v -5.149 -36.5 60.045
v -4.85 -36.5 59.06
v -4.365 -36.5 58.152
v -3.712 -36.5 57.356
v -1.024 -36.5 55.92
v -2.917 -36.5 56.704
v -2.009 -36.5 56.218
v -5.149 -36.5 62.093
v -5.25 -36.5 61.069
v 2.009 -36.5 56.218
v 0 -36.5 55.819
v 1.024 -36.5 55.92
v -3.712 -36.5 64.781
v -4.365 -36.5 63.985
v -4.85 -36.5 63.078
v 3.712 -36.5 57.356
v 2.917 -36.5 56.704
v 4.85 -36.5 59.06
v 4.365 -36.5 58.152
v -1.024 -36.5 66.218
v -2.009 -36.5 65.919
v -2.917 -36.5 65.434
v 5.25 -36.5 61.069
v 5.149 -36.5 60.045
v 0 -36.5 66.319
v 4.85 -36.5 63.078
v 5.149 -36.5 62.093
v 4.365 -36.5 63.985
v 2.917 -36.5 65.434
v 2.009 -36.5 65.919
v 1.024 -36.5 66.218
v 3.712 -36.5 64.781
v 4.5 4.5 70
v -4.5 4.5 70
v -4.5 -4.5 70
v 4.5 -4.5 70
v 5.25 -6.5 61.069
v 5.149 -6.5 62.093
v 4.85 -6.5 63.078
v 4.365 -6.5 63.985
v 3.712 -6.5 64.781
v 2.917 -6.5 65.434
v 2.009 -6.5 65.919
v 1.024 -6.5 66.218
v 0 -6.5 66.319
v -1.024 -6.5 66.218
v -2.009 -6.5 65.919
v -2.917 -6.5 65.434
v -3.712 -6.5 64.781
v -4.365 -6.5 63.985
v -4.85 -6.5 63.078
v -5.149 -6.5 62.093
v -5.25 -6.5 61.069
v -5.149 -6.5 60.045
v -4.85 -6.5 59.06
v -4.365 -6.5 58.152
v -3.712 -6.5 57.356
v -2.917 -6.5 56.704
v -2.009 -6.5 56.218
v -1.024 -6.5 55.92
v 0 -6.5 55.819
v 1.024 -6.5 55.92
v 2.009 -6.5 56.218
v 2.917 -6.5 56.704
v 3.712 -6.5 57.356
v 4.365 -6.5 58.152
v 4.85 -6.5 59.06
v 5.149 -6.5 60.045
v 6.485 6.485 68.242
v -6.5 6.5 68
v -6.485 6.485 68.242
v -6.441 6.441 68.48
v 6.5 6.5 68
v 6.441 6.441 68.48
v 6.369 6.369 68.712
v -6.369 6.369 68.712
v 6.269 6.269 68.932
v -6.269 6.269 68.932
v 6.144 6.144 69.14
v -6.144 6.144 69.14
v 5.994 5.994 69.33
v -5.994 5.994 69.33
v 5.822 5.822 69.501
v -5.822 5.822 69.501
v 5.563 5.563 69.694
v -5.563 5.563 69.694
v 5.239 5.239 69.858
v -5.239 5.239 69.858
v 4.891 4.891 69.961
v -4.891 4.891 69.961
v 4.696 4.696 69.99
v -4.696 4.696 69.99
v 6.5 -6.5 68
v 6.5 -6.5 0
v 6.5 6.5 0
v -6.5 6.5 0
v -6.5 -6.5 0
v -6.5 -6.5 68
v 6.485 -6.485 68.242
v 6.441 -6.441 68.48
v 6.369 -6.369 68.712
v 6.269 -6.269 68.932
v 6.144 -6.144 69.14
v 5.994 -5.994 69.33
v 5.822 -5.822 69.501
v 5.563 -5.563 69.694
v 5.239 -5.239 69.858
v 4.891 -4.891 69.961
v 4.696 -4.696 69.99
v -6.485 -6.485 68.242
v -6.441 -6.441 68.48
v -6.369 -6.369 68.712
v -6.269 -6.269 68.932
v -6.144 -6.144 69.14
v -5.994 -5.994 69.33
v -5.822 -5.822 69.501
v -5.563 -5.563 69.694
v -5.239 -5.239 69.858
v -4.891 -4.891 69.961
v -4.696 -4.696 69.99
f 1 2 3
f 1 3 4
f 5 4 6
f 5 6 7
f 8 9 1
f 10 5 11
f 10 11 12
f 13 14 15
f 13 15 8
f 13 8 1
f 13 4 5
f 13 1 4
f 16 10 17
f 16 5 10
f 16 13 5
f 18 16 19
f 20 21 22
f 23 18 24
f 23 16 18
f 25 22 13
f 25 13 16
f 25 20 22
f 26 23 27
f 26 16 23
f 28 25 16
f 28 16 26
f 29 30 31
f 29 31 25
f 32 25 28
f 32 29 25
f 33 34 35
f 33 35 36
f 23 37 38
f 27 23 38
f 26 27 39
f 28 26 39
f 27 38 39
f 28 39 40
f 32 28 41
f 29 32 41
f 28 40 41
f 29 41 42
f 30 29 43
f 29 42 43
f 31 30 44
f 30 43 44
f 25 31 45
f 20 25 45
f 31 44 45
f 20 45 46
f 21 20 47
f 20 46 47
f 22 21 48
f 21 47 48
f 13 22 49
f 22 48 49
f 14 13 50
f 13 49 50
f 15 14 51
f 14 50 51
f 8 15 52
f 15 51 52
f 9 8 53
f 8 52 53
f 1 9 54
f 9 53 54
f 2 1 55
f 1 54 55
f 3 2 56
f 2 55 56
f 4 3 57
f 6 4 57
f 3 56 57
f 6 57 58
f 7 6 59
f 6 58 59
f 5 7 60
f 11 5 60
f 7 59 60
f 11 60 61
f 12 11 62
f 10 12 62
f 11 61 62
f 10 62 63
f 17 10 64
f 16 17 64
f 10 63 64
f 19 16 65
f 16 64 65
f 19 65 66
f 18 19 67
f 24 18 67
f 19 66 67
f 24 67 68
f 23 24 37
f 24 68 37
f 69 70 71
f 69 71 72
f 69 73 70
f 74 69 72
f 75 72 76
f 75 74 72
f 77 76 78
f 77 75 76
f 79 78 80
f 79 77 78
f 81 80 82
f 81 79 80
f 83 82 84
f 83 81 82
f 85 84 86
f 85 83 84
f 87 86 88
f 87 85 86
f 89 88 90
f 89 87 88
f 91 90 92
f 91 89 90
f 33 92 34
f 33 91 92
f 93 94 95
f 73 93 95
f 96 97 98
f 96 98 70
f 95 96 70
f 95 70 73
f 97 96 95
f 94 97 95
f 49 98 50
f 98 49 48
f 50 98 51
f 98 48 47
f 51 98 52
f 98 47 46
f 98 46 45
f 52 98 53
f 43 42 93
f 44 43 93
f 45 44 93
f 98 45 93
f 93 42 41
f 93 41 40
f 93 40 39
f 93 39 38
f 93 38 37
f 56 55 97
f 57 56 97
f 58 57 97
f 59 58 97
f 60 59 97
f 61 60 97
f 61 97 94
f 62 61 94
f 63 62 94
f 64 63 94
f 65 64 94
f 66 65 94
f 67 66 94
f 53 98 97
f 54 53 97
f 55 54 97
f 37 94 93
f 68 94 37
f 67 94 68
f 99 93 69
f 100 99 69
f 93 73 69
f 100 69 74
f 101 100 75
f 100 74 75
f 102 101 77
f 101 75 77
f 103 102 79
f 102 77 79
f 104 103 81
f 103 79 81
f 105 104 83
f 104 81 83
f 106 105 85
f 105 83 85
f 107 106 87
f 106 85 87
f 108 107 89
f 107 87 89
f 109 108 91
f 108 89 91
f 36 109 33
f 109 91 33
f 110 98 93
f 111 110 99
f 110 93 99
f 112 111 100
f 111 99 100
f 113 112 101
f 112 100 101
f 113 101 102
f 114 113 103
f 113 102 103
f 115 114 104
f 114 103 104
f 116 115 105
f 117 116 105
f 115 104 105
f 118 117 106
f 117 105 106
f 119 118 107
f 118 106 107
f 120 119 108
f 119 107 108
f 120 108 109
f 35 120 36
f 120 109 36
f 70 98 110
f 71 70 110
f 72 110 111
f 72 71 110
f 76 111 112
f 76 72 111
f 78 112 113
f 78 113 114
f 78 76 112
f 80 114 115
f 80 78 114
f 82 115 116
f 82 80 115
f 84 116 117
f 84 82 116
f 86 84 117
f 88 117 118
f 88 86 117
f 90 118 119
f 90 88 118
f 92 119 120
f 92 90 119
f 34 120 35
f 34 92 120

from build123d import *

# Parameters (mm, degrees)
F0_W     = 13
F0_H     = 13
F1_DEPTH = 70
F2_R     = 2
F3_R     = 5.25
F4_DEPTH = 30


with BuildPart() as f1:
    # F0 (on Top) → F1 (new body)
    with BuildSketch(Plane.XY):
        Rectangle(F0_W, F0_H)
    extrude(amount=F1_DEPTH)

    # F2
    f2_edges = [f1.edges().sort_by_distance(p)[0] for p in [
        (0, 6.5, 70),
        (-6.5, 0, 70),
        (0, -6.5, 70),
        (6.5, 0, 70),
    ]]
    fillet(f2_edges, radius=F2_R)

    # F3 (on face) → F4 (join)
    with BuildSketch(Plane.XZ.offset(6.5)):
        with Locations((0, 61.068749)):
            Circle(F3_R)
    extrude(amount=F4_DEPTH)


solid = f1.part
